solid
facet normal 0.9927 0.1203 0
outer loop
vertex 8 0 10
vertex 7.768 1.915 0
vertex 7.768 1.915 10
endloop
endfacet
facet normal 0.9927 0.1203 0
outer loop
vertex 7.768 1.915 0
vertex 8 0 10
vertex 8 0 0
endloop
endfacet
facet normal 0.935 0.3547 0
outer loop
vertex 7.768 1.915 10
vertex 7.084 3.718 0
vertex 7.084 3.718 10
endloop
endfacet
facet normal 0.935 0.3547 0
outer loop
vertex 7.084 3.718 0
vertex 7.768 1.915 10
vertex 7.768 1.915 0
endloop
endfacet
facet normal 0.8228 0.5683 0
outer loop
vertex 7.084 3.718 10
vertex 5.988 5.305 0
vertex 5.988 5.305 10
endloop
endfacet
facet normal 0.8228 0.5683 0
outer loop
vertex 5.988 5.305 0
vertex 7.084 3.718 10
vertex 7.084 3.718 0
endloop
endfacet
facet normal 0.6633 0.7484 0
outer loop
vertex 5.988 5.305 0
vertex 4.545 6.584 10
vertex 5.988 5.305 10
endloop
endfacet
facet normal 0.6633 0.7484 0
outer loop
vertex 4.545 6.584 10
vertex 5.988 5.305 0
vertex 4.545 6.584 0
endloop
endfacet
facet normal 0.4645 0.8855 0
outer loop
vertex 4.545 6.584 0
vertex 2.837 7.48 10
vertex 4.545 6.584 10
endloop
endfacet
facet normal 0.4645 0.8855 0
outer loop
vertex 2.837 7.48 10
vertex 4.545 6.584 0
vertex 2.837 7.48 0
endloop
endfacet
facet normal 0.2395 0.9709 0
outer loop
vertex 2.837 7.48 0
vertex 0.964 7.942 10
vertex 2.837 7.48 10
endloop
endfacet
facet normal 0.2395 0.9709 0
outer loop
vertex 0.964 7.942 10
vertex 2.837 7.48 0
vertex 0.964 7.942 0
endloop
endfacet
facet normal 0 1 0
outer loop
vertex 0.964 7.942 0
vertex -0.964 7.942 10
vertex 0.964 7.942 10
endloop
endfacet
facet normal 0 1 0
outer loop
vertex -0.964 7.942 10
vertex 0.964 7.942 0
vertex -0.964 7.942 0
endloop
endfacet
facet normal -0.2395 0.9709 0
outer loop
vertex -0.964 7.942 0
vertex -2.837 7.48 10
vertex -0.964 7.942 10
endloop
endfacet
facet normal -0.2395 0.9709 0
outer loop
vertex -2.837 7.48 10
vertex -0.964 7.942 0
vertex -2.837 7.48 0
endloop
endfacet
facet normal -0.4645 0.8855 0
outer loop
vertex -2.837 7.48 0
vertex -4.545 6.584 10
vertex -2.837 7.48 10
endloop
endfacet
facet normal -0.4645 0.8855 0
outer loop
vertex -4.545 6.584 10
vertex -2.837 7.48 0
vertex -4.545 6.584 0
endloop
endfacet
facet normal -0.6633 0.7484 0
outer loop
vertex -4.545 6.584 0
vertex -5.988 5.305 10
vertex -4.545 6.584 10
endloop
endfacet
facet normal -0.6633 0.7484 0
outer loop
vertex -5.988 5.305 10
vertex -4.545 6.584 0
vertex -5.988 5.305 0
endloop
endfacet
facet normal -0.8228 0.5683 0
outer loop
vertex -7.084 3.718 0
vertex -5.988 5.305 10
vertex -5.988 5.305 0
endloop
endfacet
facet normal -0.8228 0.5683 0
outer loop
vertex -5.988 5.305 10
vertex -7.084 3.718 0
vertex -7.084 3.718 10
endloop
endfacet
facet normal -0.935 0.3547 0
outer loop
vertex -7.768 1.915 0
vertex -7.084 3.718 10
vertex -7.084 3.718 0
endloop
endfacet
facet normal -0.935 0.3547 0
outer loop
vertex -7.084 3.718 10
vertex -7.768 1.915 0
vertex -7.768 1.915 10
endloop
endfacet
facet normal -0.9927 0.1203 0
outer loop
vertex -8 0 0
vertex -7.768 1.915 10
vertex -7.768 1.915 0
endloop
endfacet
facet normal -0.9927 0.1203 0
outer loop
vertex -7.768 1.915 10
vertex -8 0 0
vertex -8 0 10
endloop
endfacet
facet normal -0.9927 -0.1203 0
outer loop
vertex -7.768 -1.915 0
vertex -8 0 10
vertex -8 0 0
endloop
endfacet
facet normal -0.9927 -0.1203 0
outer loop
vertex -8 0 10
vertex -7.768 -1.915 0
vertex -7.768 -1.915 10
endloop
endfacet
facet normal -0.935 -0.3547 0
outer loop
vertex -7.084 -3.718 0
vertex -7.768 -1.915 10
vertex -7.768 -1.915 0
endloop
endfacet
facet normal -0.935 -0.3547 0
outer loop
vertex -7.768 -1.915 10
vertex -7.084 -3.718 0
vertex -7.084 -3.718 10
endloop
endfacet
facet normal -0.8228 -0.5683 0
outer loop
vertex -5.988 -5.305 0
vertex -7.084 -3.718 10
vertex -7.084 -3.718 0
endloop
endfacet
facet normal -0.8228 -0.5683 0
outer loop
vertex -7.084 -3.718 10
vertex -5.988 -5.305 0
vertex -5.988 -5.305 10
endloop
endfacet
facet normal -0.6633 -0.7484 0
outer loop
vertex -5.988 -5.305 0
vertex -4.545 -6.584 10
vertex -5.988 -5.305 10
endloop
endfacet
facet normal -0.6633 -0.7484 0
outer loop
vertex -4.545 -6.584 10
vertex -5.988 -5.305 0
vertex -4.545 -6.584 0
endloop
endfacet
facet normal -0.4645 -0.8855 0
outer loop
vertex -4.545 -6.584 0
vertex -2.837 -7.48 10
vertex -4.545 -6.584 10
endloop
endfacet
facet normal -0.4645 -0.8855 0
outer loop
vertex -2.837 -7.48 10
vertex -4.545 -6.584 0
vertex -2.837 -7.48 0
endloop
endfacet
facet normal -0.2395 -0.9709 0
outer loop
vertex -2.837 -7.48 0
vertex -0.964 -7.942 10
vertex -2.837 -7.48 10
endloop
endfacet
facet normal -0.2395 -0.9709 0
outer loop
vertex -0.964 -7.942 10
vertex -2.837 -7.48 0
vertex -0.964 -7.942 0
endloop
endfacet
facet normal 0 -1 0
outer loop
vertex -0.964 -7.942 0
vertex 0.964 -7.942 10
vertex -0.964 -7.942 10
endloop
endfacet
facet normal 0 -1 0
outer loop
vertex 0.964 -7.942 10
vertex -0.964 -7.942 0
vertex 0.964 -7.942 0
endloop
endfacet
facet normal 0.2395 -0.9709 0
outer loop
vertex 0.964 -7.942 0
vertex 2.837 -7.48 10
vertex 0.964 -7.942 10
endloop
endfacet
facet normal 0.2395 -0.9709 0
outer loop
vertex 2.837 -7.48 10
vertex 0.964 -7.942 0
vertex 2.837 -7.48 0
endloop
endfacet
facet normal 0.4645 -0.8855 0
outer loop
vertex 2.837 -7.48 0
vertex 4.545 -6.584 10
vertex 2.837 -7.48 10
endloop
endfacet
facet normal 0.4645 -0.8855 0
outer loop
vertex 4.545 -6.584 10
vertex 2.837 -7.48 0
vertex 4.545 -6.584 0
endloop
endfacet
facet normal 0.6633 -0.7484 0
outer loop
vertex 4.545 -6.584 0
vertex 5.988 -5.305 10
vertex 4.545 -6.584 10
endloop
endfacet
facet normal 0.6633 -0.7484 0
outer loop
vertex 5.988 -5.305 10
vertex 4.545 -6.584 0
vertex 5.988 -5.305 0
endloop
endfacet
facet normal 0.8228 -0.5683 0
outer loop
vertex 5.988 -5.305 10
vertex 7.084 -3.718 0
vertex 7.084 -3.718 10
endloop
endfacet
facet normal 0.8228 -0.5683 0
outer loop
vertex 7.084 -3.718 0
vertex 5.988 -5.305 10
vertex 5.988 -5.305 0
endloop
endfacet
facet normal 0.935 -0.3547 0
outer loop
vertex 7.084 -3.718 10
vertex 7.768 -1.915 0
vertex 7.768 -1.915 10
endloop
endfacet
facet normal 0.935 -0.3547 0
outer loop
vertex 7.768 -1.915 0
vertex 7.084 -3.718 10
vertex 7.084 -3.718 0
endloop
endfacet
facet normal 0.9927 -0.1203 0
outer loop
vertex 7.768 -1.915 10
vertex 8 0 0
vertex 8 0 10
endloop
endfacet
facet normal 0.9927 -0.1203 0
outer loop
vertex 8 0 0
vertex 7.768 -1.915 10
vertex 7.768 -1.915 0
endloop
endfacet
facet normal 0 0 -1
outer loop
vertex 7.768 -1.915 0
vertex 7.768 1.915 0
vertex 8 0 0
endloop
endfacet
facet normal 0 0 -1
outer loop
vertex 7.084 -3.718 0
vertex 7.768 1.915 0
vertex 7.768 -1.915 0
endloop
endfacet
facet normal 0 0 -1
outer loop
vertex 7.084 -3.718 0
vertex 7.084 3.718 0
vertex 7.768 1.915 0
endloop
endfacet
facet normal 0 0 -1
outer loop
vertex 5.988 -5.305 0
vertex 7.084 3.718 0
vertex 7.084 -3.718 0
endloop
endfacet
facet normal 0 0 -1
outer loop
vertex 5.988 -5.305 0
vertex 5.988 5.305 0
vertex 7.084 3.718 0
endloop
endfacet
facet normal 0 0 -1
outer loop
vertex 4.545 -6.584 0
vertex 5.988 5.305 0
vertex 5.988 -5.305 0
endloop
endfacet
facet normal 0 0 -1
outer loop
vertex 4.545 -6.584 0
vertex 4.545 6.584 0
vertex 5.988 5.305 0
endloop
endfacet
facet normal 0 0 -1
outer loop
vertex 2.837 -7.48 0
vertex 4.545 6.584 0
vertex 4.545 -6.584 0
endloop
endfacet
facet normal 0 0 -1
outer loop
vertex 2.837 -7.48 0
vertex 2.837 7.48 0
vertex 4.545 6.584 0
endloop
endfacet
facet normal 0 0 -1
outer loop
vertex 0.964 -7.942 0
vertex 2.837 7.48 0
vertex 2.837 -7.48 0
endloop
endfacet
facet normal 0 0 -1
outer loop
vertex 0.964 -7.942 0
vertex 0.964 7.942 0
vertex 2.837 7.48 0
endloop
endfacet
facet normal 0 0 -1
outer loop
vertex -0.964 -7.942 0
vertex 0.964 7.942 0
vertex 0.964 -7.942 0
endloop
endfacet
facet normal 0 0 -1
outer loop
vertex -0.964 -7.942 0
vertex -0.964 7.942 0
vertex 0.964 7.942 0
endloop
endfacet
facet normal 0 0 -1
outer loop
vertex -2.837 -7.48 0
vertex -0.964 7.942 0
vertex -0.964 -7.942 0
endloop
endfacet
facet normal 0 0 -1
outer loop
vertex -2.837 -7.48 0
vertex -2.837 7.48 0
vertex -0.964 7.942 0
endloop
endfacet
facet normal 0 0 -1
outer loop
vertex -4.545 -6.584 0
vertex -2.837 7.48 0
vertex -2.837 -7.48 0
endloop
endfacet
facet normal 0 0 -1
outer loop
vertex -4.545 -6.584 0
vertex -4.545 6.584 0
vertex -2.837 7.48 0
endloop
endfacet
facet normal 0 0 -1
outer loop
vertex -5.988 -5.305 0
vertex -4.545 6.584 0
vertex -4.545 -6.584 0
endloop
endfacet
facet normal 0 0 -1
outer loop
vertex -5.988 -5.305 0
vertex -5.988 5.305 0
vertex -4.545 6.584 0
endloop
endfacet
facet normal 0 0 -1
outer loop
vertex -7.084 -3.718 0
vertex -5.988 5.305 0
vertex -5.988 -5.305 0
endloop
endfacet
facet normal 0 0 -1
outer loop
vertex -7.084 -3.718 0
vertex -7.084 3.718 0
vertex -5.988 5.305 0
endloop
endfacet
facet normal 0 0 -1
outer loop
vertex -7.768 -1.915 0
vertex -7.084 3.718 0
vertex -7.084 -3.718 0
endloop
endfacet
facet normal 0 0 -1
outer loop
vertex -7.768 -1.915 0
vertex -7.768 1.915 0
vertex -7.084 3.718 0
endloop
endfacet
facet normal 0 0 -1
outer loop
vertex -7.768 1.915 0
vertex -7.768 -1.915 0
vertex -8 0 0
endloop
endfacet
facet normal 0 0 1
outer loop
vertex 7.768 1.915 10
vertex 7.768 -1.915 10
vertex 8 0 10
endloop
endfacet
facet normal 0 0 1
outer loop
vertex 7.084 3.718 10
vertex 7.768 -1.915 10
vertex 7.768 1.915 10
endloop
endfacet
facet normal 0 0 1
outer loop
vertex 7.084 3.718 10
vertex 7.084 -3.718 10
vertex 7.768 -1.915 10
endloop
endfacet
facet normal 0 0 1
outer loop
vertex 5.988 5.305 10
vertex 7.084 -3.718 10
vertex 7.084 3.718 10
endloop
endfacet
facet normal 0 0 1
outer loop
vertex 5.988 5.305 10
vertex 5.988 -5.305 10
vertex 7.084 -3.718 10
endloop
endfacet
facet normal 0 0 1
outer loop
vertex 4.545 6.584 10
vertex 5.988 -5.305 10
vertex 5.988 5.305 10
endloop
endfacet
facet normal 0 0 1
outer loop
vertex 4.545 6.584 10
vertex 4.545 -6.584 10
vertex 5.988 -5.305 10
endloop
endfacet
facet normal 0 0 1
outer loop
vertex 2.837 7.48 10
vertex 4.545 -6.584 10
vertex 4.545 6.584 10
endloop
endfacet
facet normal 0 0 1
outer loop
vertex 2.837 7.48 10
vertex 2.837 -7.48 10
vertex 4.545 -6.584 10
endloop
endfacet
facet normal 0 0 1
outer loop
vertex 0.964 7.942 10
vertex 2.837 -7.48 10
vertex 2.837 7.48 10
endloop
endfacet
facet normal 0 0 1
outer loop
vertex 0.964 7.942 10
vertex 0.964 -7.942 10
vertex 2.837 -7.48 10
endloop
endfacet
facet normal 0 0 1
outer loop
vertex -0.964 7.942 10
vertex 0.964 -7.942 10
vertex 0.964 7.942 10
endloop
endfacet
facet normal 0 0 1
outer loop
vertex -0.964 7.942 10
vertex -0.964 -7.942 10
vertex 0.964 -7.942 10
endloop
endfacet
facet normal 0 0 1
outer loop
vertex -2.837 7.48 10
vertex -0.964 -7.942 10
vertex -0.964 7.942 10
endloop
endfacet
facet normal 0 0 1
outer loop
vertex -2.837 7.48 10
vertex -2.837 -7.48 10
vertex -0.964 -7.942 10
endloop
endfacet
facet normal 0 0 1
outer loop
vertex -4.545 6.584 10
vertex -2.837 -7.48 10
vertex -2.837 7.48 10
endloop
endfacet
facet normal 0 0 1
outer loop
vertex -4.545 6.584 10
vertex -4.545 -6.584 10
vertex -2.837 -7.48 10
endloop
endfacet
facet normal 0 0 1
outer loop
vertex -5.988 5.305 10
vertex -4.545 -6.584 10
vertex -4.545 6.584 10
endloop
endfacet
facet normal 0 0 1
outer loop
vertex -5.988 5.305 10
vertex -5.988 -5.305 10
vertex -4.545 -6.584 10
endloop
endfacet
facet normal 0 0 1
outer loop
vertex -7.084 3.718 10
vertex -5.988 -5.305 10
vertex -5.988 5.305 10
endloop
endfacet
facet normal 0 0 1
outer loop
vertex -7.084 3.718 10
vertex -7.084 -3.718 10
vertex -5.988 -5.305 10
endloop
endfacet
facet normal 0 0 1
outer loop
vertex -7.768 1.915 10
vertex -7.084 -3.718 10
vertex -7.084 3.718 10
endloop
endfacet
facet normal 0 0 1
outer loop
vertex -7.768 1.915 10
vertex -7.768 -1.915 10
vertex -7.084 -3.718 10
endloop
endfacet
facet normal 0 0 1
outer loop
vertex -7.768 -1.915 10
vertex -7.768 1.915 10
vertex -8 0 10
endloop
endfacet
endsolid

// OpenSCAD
// Generated by generate_scads.py
cylinder(h=10, r=8, center=false);
